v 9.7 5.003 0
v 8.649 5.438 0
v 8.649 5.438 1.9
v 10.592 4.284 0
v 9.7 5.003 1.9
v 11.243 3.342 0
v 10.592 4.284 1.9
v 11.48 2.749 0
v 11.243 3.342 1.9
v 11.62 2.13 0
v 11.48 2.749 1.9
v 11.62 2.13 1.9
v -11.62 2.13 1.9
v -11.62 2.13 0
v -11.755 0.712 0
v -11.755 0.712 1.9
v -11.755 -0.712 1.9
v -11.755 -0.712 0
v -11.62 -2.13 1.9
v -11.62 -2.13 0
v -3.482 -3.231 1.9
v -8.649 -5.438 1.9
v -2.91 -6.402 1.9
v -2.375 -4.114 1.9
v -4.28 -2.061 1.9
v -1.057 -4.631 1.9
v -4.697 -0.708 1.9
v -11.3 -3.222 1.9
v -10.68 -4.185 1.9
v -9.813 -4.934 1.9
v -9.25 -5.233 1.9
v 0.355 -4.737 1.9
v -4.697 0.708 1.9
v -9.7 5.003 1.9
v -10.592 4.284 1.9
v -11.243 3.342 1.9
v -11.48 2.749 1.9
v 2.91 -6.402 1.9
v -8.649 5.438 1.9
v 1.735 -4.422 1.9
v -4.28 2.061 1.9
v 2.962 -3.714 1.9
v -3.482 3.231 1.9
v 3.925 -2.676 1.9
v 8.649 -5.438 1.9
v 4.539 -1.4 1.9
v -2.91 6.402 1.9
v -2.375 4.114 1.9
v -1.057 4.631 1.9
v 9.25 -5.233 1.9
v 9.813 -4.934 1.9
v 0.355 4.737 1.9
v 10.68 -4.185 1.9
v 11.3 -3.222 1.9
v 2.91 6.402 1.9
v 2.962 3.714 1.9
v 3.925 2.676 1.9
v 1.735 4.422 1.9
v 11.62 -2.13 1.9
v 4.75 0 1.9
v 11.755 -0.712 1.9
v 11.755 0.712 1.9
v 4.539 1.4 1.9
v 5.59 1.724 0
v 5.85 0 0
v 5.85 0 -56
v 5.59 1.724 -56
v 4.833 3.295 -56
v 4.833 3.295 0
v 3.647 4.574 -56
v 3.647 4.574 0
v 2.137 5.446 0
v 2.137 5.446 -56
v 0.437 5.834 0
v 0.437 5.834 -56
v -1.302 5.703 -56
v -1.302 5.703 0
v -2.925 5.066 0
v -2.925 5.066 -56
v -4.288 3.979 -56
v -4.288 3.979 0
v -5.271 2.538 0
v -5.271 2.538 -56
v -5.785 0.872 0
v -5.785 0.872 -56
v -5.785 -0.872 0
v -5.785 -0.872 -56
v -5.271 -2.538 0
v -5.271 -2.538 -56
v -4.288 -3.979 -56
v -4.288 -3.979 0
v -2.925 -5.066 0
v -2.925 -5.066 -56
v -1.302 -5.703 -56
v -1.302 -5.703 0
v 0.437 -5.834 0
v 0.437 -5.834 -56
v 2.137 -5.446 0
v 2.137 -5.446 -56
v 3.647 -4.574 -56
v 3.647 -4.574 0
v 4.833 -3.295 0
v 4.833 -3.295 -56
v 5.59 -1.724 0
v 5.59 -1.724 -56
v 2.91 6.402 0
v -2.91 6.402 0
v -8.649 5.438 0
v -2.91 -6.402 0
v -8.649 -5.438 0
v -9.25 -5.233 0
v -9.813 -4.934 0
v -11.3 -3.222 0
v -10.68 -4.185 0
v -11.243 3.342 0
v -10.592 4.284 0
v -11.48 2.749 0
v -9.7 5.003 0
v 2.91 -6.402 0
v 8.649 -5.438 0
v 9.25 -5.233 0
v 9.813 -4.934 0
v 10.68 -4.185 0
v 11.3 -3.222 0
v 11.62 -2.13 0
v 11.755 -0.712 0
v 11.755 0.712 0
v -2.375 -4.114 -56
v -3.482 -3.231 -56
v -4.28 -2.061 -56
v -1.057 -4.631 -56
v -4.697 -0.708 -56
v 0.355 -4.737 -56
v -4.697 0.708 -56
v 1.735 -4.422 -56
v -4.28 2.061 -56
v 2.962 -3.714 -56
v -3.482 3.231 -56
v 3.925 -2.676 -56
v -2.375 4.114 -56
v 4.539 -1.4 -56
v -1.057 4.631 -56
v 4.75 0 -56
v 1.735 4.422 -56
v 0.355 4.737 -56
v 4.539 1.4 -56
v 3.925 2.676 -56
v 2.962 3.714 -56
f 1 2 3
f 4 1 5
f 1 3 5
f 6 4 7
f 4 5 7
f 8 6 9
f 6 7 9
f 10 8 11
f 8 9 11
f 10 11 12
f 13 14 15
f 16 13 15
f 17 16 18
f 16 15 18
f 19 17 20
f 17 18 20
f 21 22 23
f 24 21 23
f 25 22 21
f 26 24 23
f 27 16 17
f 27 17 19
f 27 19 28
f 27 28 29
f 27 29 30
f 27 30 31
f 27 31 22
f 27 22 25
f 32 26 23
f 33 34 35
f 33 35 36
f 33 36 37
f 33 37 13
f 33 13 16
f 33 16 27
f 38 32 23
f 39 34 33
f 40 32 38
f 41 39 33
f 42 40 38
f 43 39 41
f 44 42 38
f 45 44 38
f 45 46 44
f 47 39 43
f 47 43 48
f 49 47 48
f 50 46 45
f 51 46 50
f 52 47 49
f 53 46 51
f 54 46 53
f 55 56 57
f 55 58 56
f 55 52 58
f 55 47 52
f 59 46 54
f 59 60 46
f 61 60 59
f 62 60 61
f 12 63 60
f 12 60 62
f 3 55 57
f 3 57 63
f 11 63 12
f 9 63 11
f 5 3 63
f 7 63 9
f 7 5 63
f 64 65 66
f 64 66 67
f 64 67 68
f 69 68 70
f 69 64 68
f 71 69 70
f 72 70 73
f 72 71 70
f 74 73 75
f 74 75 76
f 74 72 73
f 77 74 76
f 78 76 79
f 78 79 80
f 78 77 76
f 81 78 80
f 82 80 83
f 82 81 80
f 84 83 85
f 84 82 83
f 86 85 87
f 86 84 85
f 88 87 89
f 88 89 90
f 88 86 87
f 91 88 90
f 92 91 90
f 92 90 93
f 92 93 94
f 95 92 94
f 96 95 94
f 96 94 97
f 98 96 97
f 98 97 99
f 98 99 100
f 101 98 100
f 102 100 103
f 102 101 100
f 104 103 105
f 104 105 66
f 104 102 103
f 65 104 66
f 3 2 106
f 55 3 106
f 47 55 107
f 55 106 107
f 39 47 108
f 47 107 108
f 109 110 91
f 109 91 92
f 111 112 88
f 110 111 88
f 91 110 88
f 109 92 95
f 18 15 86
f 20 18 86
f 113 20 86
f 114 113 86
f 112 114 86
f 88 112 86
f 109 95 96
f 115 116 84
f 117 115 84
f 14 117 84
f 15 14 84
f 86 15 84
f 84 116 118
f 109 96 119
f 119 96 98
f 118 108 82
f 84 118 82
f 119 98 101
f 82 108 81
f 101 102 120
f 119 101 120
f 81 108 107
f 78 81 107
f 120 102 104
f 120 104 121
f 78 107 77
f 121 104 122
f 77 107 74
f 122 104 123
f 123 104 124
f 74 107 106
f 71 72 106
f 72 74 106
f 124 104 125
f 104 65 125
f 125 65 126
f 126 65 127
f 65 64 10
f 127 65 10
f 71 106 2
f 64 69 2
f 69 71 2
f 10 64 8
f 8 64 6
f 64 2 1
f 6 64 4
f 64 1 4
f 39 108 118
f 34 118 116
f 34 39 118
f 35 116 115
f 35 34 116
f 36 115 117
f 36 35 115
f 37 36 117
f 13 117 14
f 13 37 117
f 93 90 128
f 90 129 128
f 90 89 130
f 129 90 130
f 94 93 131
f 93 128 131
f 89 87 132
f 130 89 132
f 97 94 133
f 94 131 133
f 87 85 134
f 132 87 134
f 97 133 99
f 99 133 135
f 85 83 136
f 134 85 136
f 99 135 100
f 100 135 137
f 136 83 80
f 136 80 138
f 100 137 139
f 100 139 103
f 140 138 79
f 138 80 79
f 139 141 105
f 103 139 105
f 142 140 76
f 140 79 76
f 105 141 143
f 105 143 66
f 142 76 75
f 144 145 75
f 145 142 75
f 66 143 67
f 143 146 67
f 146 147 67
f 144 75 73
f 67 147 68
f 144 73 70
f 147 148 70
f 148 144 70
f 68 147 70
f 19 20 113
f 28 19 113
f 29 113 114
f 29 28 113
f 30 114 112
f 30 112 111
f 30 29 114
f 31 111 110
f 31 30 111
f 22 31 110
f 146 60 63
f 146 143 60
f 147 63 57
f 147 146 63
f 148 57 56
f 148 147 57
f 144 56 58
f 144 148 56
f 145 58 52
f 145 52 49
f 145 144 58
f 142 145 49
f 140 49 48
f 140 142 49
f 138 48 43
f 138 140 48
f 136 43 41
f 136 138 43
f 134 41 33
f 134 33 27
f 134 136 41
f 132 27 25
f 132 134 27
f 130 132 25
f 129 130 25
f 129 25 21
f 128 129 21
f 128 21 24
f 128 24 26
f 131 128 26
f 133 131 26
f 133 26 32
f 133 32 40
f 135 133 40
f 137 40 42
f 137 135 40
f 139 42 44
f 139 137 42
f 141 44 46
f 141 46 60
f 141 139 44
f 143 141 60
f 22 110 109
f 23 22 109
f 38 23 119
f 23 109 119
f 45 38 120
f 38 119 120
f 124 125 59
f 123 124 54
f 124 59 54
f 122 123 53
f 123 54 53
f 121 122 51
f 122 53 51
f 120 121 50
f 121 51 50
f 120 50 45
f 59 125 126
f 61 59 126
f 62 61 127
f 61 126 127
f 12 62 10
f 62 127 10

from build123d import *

# Parameters (mm, degrees)
SKETCH_R      = 4.75
PAD_DEPTH     = 1.9
SKETCH001_R   = 5.85
SKETCH001_R_2 = 4.75
PAD001_DEPTH  = 56
FILLET_R      = 4


with BuildPart() as part:
    # Sketch → Pad (new body)
    with BuildSketch(Plane.XY):
        with BuildLine():
            ThreePointArc((11, 4.75), (0, 6.523505), (-11, 4.75))
            ThreePointArc((-11, 4.75), (-11.771947, 0), (-11, -4.75))
            ThreePointArc((-11, -4.75), (0, -6.523505), (11, -4.75))
            ThreePointArc((11, -4.75), (11.771947, 0), (11, 4.75))
        make_face()
        Circle(SKETCH_R, mode=Mode.SUBTRACT)
    extrude(amount=PAD_DEPTH)

    # Sketch001 → Pad001 (join)
    with BuildSketch(Plane.XY):
        Circle(SKETCH001_R)
        Circle(SKETCH001_R_2, mode=Mode.SUBTRACT)
    extrude(amount=-PAD001_DEPTH)

    # Fillet
    fillet_edges = [part.edges().sort_by_distance(p)[0] for p in [
        (11, -4.75, 0.95),
        (-11, -4.75, 0.95),
        (-11, 4.75, 0.95),
        (11, 4.75, 0.95),
    ]]
    fillet(fillet_edges, radius=FILLET_R)


solid = part.part
